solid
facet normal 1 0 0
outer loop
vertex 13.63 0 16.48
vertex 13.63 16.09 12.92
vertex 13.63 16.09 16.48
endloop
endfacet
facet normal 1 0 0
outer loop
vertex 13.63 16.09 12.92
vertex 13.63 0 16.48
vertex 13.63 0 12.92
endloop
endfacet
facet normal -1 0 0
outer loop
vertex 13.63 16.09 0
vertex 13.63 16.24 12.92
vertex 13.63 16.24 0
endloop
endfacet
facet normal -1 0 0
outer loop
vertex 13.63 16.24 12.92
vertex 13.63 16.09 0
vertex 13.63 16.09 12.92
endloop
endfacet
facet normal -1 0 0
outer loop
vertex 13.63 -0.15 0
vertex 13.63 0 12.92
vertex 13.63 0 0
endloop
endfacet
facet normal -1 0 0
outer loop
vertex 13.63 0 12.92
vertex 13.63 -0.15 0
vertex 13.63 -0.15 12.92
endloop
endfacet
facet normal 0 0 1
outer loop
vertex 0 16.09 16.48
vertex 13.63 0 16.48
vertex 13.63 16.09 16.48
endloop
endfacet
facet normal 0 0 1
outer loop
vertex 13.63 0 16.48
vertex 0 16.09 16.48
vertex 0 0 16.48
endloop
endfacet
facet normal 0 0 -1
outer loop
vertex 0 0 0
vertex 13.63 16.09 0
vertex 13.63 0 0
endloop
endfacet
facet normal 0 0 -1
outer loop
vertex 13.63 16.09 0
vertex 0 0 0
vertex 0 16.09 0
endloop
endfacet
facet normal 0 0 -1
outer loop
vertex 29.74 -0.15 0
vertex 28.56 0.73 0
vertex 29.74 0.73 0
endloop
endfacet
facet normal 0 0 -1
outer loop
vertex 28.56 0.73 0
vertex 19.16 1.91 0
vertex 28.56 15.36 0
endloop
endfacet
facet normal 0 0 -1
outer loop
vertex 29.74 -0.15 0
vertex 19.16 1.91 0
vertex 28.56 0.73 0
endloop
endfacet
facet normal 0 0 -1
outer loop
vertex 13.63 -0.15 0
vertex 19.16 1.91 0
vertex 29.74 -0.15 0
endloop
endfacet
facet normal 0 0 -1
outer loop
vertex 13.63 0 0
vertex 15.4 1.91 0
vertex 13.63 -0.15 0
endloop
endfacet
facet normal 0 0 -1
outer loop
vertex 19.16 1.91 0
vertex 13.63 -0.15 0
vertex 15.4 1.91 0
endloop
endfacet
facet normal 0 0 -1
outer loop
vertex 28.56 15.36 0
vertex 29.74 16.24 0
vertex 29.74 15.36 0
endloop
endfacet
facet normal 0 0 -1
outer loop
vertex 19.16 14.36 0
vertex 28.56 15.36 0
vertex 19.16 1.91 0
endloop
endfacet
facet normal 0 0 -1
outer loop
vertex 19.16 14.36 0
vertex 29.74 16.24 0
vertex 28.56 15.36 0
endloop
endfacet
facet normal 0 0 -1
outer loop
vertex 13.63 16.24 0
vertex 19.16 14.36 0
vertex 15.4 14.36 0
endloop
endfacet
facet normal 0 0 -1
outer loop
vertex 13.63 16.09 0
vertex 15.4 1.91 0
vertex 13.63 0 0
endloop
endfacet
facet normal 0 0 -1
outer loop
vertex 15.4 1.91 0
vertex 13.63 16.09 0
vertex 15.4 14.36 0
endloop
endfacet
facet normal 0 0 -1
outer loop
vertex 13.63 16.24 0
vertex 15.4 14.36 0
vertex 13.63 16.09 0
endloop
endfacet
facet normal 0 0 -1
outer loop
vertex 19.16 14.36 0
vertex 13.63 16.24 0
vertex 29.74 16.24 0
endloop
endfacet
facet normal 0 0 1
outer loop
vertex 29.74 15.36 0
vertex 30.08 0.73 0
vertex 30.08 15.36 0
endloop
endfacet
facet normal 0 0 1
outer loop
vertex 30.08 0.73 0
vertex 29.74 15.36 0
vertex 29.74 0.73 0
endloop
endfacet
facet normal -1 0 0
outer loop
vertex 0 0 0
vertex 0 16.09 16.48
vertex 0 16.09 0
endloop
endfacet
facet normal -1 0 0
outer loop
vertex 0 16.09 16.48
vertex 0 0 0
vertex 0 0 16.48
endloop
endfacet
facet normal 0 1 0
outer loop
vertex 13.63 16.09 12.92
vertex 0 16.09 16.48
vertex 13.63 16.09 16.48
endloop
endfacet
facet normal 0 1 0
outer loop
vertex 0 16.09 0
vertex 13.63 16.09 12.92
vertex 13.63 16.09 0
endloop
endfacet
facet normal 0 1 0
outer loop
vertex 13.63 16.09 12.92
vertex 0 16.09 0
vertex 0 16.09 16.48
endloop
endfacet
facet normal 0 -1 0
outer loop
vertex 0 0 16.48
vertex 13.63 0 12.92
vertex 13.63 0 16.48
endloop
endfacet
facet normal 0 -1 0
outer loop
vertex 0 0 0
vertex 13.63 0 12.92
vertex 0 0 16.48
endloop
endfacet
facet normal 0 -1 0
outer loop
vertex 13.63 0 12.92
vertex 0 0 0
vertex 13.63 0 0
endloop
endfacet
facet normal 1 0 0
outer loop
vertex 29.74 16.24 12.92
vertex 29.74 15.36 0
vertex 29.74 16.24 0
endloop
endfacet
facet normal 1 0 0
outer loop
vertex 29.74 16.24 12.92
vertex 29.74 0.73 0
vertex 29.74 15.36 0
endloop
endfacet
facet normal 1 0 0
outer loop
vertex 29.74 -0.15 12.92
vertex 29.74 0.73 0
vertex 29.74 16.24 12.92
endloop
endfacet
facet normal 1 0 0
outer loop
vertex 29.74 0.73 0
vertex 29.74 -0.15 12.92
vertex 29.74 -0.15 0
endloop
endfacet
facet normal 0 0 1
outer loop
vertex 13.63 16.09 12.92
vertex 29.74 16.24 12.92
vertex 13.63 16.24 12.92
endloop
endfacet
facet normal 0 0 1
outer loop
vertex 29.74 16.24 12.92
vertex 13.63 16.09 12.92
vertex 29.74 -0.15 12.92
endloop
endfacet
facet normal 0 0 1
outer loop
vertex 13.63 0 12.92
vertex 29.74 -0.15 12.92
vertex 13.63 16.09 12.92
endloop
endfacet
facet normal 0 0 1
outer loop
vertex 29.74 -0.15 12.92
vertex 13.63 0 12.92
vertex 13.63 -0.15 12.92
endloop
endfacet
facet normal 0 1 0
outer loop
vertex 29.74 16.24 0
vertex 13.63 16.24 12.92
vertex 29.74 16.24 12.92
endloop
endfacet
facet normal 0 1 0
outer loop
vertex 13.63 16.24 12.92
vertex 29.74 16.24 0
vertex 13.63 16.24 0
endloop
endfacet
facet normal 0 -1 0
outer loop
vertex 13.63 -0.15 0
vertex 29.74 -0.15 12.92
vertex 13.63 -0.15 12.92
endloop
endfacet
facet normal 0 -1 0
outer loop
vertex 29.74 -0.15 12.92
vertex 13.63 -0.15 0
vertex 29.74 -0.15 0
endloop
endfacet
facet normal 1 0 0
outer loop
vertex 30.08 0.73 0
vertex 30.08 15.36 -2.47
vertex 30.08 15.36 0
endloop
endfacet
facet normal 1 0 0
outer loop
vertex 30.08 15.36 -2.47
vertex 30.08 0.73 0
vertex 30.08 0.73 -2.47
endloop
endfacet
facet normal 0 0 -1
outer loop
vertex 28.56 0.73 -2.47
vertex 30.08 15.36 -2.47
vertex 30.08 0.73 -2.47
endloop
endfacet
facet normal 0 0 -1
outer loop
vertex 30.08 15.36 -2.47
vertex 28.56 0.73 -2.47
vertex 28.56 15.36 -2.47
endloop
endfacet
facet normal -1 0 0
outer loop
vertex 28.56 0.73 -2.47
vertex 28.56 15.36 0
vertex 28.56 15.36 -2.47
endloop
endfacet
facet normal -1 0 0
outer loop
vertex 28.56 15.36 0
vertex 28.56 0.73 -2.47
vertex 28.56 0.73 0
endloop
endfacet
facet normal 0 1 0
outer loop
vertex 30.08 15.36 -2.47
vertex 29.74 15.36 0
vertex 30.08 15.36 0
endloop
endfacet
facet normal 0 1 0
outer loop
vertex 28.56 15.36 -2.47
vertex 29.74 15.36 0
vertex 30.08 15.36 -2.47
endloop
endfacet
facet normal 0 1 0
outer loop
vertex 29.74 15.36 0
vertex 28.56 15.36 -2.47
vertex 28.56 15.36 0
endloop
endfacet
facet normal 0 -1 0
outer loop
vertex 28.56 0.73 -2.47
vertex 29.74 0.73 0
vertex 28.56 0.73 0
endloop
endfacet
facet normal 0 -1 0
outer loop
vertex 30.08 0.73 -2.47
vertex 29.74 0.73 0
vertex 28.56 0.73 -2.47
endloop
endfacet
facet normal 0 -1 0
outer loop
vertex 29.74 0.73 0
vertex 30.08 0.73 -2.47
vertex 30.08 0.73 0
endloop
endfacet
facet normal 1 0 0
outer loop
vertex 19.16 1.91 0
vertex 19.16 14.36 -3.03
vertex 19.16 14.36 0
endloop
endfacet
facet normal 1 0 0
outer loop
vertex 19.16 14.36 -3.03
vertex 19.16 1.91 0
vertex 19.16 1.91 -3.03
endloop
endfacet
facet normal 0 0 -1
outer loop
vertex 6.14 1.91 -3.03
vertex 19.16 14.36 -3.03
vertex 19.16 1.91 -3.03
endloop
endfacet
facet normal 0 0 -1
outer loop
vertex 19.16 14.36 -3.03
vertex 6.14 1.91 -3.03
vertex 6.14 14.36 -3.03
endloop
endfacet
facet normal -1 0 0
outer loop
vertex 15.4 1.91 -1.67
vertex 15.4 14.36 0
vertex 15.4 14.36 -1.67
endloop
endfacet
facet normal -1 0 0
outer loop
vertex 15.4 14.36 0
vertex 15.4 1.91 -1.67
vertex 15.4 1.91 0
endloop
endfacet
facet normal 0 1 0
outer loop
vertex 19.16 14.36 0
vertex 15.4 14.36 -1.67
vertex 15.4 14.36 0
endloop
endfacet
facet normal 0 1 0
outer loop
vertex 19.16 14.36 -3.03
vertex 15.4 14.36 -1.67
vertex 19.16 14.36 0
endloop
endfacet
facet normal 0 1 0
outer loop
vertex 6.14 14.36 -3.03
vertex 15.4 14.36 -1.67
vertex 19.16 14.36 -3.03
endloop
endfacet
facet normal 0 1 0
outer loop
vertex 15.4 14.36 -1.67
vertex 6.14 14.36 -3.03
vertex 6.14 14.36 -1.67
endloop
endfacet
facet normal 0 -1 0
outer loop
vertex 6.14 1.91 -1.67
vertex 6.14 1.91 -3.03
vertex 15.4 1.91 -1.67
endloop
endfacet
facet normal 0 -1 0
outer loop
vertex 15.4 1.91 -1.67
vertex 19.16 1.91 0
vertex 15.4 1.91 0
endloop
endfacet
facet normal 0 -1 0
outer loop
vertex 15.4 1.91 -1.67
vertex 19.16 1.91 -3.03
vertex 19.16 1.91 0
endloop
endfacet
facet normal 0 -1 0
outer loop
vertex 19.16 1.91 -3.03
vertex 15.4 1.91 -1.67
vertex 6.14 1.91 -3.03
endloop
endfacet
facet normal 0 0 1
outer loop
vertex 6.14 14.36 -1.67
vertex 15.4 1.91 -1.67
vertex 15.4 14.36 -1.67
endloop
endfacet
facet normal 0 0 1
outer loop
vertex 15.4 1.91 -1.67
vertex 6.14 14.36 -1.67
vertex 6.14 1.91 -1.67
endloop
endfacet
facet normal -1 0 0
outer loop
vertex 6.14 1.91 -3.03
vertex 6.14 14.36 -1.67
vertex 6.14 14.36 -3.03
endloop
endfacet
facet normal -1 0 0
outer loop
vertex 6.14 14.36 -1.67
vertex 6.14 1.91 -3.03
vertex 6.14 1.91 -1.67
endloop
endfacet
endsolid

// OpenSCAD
//
// RJ45 jack
// Shaxon 110-Type Keystone Jack.  Found at Fry's Electronics
//
module bbs_rj45()
{
    union()
    {
        cube([13.63, 16.09, 16.48], center=false);
        translate([13.63, -0.15, 0]) cube([16.11, 16.39, 12.92], center=false);
        translate([28.56, (16.09-14.63)/2, -2.47]) cube([1.52, 14.63, 2.47], center=false);
        translate([15.40, 1.91, -3.03]) cube([3.76, 12.45, 3.03], center=false);
        translate([6.14, 1.91, -3.03]) cube([12.30, 12.45, 1.36], center=false);
    }
}


bbs_rj45();
